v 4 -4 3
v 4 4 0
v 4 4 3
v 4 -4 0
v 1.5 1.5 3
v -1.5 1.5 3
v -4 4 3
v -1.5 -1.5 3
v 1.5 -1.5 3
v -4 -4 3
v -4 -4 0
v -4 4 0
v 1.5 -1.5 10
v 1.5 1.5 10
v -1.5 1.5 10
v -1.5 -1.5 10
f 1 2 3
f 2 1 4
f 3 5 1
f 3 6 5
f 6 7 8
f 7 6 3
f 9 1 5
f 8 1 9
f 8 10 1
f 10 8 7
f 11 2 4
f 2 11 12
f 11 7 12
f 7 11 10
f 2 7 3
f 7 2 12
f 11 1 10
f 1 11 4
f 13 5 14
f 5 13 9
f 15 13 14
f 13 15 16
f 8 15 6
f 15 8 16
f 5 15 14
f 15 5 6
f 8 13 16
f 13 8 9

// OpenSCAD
//	General settings
	filename = "skawa_logo_circle.dxf";
	cutter_height = 10;
	cutter_thickness = 3;
	cutter_lip = 5 + cutter_thickness;

	render() slim_cookie_cutter();
//render() blocky_cookie_cutter();

module slim_cookie_cutter()
	{
	difference()
		{
		union()
			{
			//	Cookie Cutter Lip
			minkowski()
				{
				linear_extrude(height=0.001, center=false) render_exterior();
				translate([0,0,cutter_thickness/2]) 
					cube([cutter_lip,cutter_lip,cutter_thickness], center=true);
				}
			//	Cookie Cutter Height
			minkowski()
				{
				linear_extrude(height=0.001, center=false) render_cutout();
				translate([0,0,cutter_height/2]) 
					cube([cutter_thickness,cutter_thickness,cutter_height], center=true);
				}
			}
		//	Cut out the shape
		translate([0,0,1]) linear_extrude(height=cutter_height*2, center=false) render_cutout();
		}
	}

module blocky_cookie_cutter()
	{
	difference()
		{
		union()
			{
			//	Cookie Cutter Lip
			minkowski()
				{
				linear_extrude(height=0.001, center=false) render_exterior();
				translate([0,0,cutter_thickness/2]) 
					cube([cutter_lip,cutter_lip,cutter_thickness], center=true);
				}
			//	Cookie Cutter Height
			minkowski()
				{
				linear_extrude(height=0.001, center=false) render_exterior();
				translate([0,0,cutter_height/2]) 
					cube([cutter_thickness,cutter_thickness,cutter_height], center=true);
				}
			}
		//	Cut out the shape
		translate([0,0,-1]) linear_extrude(height=cutter_height*2, center=false) render_cutout();
		}
	}


//	Module for rendering DXF
module render_exterior(name = filename)
	{ render() hull() import(file = name); }

//	Module for rendering DXF
module render_cutout(name = filename)
	{ render() import(file = name); }
